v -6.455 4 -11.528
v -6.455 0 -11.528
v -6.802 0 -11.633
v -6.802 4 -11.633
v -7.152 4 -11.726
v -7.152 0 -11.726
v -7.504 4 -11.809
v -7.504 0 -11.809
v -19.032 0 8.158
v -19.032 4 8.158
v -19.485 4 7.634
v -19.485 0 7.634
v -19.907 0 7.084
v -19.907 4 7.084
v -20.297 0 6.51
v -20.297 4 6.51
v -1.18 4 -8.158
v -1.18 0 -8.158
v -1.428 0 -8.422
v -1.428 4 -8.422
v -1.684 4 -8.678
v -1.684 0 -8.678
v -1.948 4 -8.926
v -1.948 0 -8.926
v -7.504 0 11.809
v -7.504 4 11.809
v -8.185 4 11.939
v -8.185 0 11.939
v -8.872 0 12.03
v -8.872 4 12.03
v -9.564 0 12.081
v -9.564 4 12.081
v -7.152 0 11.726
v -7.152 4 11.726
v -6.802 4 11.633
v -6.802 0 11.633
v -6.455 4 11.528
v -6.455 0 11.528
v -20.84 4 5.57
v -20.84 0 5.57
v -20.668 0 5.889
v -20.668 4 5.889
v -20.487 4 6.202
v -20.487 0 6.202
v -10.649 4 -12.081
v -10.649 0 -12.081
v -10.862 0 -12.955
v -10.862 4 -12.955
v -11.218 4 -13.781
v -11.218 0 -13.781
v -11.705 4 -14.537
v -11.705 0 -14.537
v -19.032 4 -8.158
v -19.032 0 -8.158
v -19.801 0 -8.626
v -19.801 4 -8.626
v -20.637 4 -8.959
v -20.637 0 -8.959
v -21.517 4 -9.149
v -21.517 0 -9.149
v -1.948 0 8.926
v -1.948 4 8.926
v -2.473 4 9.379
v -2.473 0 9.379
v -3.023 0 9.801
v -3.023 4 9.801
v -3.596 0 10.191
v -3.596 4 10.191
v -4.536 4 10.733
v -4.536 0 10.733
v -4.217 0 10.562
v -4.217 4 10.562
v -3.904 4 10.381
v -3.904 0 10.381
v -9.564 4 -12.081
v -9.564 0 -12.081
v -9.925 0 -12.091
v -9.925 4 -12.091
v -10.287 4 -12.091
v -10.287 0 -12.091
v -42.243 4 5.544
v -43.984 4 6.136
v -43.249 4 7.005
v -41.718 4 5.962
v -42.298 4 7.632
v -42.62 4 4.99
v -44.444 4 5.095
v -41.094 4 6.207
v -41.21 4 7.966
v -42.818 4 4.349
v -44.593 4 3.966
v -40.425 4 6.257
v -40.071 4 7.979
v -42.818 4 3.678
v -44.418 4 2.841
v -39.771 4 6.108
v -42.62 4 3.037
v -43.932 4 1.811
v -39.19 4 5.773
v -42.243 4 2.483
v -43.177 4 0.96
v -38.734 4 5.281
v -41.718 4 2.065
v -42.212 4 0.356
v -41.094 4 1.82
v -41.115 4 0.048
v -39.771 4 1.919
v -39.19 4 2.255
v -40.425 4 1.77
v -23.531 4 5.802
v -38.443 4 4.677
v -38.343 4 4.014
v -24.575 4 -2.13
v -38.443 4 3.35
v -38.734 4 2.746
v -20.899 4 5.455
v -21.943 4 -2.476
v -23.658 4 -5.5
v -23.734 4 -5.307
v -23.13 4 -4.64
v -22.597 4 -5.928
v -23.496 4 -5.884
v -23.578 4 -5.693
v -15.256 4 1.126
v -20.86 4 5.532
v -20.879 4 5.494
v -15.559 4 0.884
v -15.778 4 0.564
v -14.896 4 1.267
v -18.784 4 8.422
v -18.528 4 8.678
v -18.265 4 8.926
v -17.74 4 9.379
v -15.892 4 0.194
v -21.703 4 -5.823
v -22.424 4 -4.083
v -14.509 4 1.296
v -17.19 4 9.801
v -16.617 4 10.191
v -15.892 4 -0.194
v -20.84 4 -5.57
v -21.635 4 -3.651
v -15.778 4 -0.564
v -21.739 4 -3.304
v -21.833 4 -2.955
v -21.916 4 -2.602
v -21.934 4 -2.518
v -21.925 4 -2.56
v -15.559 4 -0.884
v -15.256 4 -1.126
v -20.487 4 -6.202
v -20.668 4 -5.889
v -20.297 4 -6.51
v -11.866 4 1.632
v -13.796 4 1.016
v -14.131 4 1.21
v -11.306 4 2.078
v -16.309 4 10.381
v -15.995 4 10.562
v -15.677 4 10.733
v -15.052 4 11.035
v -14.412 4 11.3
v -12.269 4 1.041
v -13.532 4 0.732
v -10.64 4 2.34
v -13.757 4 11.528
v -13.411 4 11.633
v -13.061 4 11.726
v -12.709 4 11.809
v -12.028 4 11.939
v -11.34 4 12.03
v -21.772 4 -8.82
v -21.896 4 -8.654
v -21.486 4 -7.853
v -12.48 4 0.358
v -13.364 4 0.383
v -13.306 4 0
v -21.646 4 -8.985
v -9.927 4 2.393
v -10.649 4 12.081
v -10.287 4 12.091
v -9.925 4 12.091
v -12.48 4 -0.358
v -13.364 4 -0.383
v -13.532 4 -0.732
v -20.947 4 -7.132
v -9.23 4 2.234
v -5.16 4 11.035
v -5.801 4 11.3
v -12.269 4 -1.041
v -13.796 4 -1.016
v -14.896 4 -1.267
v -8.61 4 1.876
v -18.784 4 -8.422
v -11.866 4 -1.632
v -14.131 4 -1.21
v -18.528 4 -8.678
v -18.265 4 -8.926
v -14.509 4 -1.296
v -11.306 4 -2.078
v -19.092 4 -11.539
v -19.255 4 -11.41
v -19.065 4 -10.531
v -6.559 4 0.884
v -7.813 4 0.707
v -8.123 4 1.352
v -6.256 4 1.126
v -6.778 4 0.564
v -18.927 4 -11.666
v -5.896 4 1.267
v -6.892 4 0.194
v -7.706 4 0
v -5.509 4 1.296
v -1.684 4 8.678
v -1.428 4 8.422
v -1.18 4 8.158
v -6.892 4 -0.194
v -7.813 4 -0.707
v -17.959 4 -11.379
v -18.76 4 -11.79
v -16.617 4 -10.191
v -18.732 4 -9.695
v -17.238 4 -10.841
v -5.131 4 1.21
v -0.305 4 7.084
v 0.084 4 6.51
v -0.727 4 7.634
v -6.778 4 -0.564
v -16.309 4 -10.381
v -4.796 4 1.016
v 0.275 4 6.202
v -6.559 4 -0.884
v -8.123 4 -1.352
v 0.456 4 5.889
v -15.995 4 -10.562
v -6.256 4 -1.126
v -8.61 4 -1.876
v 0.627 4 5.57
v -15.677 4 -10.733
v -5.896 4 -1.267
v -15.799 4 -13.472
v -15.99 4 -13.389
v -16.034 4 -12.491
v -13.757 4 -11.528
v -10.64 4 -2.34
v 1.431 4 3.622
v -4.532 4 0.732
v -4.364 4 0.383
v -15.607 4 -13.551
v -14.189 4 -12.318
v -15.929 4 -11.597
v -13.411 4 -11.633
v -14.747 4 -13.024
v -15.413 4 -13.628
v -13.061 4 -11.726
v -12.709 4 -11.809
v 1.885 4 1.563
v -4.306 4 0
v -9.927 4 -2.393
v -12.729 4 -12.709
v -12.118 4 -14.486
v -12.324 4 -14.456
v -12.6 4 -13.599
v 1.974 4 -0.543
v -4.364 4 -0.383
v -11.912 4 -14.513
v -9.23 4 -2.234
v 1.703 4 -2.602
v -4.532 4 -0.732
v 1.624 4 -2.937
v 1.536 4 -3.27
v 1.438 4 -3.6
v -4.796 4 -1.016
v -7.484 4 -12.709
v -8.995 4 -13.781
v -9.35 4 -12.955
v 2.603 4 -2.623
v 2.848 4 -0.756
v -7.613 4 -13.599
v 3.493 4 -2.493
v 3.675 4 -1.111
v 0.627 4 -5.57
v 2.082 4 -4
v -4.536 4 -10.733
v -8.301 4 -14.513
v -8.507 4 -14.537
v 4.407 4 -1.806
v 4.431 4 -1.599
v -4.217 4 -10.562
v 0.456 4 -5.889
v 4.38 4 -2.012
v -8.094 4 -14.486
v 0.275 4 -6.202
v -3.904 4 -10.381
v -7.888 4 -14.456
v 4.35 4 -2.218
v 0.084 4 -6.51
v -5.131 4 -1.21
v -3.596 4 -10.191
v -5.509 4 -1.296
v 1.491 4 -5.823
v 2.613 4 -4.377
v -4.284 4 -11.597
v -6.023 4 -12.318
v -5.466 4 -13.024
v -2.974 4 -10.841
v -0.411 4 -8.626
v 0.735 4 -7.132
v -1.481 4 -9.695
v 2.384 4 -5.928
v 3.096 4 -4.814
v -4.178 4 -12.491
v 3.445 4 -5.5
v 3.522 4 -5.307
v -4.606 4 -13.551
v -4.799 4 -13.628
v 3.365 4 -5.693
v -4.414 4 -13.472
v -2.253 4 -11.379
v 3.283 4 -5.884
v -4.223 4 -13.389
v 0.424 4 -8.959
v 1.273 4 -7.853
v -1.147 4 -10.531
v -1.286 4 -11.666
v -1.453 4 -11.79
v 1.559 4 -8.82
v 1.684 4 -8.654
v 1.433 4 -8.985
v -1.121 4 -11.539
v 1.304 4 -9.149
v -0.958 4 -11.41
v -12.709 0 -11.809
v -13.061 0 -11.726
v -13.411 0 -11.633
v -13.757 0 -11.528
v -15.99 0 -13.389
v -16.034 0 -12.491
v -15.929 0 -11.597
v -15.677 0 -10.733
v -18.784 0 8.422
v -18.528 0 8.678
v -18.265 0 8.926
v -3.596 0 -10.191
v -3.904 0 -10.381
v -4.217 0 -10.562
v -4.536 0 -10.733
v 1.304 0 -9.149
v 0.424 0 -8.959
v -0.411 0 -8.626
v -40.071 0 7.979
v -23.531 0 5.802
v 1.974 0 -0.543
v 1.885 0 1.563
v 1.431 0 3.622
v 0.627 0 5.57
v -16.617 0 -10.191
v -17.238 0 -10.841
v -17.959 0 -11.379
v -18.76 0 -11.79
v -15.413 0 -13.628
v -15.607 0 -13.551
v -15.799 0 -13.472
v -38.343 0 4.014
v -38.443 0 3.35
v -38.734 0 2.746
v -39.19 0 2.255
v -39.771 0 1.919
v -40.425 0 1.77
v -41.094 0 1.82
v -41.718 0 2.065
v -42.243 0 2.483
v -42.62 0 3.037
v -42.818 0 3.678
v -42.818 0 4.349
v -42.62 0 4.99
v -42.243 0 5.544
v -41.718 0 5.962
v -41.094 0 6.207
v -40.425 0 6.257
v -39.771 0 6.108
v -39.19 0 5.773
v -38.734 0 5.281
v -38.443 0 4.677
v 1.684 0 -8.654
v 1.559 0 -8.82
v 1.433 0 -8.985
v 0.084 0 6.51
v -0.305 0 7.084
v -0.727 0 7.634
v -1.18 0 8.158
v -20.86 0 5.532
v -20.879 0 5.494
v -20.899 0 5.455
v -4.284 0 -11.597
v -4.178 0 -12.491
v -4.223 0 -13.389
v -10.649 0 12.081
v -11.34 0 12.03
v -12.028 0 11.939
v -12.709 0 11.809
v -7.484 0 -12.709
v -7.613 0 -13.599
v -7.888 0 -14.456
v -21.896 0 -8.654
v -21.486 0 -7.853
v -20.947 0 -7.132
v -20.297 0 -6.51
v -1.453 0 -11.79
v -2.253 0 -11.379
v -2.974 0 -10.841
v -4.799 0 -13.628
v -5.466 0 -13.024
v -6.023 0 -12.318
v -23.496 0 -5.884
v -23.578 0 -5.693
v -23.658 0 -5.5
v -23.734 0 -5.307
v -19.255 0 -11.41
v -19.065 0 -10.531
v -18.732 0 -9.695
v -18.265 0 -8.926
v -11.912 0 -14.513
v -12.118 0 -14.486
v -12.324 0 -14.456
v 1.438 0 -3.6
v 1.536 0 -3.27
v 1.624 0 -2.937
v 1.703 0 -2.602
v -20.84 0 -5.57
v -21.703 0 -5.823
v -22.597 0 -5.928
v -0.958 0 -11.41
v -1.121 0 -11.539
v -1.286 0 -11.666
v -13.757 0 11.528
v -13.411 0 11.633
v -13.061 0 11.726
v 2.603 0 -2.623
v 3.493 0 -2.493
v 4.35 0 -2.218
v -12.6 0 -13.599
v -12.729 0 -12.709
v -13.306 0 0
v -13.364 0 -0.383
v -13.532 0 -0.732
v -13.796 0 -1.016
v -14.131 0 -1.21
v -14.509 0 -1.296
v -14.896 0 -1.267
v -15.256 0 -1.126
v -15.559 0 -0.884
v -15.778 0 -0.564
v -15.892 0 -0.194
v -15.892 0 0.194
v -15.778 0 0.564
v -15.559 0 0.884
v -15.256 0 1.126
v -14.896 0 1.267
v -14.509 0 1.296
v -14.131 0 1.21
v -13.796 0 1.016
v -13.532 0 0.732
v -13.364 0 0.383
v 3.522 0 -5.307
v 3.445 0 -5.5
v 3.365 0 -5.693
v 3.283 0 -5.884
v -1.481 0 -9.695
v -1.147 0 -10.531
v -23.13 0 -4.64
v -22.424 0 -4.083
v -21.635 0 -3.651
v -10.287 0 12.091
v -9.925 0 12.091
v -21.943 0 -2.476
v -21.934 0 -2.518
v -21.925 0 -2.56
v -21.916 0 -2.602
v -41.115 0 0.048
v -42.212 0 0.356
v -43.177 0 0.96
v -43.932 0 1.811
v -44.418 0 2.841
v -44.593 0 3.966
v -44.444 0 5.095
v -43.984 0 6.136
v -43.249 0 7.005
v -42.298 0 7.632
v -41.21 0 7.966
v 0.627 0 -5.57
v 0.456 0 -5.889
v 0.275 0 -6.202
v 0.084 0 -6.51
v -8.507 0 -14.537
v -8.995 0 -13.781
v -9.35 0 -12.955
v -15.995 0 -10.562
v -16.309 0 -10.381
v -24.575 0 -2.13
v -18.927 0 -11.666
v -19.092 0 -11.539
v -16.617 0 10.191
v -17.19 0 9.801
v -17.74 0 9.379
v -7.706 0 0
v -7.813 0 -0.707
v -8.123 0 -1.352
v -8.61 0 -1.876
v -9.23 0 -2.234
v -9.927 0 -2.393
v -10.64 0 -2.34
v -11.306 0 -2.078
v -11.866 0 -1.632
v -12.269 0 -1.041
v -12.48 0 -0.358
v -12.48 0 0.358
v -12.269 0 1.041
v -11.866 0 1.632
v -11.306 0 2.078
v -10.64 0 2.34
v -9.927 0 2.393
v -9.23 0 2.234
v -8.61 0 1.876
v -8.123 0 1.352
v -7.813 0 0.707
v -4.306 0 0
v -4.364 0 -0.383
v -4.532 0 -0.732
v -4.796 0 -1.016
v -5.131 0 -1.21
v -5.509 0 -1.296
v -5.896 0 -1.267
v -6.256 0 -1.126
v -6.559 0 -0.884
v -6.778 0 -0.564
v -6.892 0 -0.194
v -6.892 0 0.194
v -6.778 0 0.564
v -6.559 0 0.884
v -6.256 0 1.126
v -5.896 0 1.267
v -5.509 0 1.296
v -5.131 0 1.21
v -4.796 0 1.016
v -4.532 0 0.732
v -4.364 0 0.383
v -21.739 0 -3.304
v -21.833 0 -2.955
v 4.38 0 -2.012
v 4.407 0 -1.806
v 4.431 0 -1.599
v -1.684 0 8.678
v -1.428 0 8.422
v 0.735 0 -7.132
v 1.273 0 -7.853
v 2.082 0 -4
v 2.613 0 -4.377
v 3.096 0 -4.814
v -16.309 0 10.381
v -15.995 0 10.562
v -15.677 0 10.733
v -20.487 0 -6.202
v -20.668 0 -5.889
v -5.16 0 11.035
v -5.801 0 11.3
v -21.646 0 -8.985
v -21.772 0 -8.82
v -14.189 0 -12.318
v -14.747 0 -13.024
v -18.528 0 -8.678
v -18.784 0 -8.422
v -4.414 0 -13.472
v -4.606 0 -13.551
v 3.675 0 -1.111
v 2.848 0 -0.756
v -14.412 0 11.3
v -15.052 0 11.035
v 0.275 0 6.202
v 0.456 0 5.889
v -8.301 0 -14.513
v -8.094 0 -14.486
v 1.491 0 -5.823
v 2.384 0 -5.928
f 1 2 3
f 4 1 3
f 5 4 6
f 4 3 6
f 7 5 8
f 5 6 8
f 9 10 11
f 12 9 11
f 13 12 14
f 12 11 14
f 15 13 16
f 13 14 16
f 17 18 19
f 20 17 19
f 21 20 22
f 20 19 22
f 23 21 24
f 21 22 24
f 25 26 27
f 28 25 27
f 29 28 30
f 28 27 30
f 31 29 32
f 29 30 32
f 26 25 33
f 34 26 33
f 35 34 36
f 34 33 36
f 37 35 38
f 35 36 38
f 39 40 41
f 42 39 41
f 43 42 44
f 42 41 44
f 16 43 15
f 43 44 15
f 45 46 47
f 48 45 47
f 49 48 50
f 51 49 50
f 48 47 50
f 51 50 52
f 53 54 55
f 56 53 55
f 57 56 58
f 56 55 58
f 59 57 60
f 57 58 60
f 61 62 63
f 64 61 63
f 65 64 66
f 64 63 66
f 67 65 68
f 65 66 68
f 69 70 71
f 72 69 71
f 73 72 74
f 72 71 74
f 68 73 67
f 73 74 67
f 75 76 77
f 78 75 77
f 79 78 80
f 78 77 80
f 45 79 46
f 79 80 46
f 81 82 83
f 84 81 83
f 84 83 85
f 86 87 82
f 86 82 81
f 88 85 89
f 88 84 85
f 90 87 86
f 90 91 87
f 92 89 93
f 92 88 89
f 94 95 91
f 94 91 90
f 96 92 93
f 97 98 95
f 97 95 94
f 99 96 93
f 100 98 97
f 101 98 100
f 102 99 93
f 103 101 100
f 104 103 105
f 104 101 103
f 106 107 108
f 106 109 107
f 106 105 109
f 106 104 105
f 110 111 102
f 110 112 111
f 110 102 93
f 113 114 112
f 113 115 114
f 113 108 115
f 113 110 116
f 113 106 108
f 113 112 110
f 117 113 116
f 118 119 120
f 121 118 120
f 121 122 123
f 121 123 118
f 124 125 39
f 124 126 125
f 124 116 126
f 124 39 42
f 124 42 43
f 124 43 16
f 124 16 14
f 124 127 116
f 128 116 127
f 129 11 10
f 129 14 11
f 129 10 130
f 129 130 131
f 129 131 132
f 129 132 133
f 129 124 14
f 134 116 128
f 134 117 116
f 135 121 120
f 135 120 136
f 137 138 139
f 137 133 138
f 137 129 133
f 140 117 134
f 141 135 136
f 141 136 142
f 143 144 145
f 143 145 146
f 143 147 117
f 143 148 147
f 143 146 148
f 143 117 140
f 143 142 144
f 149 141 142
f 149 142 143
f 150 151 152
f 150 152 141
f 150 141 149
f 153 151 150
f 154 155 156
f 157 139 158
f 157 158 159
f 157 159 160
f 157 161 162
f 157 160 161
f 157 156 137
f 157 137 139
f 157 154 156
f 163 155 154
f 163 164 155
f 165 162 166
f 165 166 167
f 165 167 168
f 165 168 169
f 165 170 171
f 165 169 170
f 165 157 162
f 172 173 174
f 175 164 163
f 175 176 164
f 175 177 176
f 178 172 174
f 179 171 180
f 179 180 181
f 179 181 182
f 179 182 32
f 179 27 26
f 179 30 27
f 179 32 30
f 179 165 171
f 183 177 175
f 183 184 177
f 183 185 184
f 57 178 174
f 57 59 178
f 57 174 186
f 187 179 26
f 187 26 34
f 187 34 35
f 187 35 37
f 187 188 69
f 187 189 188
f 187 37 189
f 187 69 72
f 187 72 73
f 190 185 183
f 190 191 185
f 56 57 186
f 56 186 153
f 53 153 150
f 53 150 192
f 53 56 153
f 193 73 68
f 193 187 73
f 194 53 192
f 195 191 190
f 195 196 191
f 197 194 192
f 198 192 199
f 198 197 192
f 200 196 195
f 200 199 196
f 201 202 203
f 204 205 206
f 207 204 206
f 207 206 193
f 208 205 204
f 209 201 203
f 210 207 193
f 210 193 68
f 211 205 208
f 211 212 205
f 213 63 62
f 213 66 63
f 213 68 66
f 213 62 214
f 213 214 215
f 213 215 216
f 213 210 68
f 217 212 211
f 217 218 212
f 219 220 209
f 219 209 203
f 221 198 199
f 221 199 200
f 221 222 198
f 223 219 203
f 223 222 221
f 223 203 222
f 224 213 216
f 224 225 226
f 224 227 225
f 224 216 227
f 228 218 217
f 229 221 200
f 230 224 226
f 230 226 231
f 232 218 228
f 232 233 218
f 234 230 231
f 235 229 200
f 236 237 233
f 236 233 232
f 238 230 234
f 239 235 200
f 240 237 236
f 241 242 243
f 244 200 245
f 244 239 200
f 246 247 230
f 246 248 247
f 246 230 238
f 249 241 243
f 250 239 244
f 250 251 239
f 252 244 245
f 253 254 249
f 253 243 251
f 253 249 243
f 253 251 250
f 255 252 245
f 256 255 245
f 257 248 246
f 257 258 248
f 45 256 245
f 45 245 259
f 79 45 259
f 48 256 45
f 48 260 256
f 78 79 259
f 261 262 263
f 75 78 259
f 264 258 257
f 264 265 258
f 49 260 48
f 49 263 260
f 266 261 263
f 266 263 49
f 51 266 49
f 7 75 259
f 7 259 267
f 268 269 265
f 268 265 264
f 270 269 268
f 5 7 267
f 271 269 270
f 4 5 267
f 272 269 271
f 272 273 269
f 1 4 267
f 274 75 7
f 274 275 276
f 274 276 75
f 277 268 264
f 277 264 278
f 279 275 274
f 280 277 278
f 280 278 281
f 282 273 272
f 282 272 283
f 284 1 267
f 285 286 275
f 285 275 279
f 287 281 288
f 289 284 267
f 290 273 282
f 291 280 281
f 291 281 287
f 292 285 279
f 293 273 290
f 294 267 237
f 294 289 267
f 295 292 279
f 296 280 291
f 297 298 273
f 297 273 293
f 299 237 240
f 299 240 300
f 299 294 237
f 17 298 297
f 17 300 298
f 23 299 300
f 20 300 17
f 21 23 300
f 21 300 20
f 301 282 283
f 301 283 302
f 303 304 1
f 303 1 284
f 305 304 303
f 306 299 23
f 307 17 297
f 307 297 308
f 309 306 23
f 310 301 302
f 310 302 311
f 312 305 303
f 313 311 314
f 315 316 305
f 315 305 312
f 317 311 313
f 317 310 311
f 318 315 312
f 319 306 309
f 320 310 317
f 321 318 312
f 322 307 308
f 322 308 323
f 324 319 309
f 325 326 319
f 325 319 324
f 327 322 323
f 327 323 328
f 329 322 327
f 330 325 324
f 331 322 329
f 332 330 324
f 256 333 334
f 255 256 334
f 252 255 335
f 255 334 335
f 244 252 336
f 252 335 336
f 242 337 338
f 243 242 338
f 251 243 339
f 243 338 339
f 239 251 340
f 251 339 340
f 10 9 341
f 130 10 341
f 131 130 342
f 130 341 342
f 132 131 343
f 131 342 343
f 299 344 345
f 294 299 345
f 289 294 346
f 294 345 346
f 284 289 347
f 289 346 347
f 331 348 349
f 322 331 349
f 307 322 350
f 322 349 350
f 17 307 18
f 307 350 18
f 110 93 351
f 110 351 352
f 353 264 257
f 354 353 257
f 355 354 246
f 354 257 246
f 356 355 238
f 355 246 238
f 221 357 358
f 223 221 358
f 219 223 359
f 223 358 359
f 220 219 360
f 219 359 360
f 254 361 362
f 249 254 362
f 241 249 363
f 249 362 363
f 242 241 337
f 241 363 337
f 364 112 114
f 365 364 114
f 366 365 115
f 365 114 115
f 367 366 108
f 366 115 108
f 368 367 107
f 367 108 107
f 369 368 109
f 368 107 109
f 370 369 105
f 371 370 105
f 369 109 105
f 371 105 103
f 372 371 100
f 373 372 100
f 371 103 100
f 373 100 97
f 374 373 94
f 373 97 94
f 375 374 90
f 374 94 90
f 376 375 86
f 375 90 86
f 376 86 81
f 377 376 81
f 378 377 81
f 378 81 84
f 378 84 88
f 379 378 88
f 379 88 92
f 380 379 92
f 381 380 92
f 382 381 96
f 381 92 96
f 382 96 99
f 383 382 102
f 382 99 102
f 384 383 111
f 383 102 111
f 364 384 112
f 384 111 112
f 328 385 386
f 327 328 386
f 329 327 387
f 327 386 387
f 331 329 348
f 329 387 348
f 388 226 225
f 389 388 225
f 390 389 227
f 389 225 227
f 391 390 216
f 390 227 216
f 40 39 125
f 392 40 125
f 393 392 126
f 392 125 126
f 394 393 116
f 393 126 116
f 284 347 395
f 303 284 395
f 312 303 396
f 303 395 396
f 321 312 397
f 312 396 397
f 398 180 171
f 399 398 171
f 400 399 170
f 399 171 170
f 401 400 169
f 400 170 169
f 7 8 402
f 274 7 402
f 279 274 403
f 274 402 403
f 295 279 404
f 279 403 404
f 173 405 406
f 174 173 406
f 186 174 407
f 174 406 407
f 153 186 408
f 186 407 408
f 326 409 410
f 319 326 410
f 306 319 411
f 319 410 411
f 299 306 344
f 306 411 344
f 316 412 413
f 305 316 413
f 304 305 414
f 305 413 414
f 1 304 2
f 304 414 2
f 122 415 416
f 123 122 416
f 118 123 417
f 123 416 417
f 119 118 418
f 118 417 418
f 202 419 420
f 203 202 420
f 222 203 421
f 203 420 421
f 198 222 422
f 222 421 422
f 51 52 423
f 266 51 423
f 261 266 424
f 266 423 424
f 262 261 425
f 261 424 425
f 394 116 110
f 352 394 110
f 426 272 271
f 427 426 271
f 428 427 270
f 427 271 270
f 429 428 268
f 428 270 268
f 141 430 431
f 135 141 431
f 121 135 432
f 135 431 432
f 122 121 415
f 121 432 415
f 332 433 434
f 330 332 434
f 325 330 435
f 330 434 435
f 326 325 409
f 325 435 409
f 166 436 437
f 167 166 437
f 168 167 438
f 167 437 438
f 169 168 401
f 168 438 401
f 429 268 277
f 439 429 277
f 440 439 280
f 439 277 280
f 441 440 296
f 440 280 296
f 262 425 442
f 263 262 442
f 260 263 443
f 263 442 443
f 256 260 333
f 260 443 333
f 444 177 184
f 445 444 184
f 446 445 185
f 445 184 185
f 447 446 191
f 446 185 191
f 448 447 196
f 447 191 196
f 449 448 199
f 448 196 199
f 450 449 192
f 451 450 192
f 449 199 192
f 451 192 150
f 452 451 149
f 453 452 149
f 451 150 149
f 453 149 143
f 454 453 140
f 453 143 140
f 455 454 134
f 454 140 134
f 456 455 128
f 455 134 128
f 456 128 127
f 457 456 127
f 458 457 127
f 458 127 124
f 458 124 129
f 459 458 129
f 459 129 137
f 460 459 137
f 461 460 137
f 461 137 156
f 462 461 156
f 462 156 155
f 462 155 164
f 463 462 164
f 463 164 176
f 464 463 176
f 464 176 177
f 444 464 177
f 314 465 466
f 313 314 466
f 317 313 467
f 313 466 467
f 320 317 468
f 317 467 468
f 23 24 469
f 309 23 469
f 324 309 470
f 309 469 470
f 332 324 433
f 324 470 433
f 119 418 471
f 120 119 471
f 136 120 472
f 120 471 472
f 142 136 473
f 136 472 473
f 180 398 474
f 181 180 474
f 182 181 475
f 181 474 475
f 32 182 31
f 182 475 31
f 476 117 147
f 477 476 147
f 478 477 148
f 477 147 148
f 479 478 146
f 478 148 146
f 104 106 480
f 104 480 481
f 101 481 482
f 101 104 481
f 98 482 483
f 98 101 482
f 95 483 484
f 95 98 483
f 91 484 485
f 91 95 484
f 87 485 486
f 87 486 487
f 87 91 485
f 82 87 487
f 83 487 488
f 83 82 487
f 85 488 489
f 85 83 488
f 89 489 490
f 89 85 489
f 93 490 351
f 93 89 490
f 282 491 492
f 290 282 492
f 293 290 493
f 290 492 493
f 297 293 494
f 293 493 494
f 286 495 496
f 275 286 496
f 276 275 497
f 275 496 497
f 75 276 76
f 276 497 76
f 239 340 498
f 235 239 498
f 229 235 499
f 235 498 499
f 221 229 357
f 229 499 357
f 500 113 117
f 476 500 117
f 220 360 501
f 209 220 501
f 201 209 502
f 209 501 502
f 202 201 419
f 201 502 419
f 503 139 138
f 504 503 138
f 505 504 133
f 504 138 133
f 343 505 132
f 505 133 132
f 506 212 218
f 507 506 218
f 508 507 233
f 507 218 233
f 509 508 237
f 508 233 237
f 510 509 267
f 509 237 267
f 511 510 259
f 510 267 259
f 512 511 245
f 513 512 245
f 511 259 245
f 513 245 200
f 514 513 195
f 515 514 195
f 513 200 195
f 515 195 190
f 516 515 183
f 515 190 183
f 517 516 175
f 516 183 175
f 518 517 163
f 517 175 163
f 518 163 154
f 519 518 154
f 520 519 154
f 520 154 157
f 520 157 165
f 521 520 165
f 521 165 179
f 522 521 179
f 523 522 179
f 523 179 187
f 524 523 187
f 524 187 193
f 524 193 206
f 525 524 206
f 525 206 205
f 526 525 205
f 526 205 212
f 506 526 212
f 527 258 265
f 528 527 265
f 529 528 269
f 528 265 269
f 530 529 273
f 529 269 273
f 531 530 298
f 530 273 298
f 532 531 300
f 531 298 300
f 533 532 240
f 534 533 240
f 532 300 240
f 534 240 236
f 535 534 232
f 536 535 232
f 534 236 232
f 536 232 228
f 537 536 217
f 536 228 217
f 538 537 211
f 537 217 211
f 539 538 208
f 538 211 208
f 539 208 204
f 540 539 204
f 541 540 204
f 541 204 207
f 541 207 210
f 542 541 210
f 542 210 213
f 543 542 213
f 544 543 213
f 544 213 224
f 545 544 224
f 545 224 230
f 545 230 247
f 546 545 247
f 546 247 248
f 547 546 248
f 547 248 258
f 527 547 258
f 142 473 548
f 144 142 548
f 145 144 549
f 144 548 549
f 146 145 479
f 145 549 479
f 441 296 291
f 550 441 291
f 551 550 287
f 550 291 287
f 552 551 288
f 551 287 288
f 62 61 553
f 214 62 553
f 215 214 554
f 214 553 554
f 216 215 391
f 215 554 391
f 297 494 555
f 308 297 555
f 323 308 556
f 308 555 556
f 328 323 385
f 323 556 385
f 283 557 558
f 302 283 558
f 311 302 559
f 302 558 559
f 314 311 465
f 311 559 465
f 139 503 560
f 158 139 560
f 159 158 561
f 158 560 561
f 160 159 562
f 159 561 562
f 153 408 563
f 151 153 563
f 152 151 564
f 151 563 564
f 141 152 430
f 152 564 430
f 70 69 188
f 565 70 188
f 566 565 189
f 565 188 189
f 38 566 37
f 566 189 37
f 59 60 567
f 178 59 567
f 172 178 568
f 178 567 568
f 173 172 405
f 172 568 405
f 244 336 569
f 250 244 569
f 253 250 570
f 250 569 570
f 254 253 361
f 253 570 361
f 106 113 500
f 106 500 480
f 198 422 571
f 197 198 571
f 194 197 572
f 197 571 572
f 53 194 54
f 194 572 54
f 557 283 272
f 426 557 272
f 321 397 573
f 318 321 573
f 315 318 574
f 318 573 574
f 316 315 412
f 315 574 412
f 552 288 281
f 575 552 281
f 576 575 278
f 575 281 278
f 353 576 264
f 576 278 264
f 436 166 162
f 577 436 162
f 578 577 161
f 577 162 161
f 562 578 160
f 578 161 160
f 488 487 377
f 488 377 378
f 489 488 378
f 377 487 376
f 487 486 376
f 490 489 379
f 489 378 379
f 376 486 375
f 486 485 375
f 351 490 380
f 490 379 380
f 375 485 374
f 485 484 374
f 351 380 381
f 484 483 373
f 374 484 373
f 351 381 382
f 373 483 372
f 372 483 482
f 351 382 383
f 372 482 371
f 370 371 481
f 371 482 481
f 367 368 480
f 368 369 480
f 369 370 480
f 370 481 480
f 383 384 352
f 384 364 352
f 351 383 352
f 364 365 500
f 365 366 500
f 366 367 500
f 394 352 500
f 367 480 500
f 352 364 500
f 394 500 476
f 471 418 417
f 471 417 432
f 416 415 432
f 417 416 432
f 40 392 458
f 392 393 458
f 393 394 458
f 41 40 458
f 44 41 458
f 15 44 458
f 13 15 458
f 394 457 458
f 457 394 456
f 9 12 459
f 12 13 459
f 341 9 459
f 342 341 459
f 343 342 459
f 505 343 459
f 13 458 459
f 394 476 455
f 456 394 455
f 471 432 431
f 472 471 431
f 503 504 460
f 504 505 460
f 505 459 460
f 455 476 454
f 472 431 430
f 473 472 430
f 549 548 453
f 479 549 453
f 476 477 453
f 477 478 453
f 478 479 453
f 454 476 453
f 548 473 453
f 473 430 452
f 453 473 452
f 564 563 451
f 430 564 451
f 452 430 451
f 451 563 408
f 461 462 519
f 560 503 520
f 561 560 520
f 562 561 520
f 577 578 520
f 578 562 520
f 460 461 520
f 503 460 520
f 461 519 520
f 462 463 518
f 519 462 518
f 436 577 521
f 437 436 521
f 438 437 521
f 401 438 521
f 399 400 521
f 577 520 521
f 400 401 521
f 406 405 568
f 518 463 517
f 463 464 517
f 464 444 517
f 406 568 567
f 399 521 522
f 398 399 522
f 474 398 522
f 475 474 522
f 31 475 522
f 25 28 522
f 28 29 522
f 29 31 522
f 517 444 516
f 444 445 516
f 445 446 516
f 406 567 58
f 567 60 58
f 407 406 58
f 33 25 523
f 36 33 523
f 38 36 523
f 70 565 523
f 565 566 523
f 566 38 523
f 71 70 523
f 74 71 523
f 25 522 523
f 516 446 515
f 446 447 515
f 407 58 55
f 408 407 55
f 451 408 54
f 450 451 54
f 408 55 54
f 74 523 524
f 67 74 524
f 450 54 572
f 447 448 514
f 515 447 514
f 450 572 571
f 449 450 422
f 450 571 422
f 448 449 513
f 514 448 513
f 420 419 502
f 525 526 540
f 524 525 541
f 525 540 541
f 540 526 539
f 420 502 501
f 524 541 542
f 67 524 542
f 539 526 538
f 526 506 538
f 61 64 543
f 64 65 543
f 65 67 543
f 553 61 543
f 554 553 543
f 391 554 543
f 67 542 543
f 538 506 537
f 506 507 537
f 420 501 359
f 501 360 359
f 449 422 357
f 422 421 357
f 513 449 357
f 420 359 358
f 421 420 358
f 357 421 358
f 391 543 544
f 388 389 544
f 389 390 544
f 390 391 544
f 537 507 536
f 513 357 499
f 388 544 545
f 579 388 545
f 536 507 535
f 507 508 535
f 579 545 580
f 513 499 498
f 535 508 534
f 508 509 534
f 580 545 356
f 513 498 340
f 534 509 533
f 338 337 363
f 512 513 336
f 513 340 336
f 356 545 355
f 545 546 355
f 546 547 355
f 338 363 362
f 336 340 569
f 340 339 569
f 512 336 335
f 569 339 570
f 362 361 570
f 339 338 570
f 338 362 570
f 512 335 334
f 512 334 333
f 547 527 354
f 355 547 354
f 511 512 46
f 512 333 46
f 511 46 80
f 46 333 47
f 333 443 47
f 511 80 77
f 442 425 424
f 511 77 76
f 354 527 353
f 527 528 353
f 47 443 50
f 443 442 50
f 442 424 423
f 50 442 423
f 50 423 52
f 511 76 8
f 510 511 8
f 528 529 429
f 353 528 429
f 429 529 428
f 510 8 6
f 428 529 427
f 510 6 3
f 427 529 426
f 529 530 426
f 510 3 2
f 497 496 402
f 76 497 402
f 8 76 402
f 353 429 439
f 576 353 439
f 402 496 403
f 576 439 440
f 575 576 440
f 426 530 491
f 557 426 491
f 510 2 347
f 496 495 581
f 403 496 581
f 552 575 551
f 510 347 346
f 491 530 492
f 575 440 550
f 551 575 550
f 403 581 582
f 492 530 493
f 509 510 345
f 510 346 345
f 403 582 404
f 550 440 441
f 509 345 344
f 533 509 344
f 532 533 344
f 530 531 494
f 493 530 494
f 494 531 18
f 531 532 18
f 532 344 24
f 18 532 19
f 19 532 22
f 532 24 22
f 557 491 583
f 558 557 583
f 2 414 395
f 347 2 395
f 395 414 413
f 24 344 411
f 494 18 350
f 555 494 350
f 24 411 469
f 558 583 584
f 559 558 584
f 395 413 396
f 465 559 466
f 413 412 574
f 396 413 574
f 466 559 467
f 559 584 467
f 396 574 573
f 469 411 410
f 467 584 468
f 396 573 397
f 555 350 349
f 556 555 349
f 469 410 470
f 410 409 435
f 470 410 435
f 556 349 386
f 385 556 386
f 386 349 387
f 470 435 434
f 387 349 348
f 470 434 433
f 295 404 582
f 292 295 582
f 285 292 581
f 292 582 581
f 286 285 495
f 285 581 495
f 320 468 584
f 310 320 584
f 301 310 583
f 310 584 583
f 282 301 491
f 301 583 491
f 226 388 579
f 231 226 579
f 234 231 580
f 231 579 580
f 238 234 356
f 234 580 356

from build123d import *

# Parameters (mm, degrees)
SKETCH1_R           = 1.5
SKETCH1_R_2         = 2.25
BOSS_EXTRUDE1_DEPTH = 4
SKETCH3_R           = 2.25
BOSS_EXTRUDE2_DEPTH = 4
CUT_EXTRUDE1_DEPTH  = 4
CUT_EXTRUDE2_REACH  = 6
SKETCH5_R           = 1.3
SKETCH5_R_2         = 2.4


with BuildPart() as part:
    # Sketch1 → Boss-Extrude1 (new body)
    with BuildSketch(Plane(origin=(0, 0, 0), x_dir=(1, 0, 0), z_dir=(0, 1, 0))):
        with BuildLine():
            Line((20.643657446, 4), (2.081641936, 4))
            ThreePointArc((2.081641936, 4), (2.861028333, 4.588201733), (3.521749436, 5.30713988))
            ThreePointArc((3.521749436, 5.30713988), (3.405395609, 5.596745198), (3.282888305, 5.883801663))
            ThreePointArc((3.282888305, 5.883801663), (1.93527598, 5.894040025), (0.627094961, 5.57027124))
            ThreePointArc((0.627094961, 5.57027124), (0.366286148, 6.046375), (0.084372603, 6.510293938))
            ThreePointArc((0.084372603, 6.510293938), (1.018855105, 7.48132754), (1.683794586, 8.65351323))
            ThreePointArc((1.683794586, 8.65351323), (1.496450048, 8.903135899), (1.303821399, 9.148703928))
            ThreePointArc((1.303821399, 9.148703928), (-0.000522033, 8.809805691), (-1.180330337, 8.158486898))
            ThreePointArc((-1.180330337, 8.158486898), (-1.555477026, 8.550865528), (-1.947855656, 8.926012217))
            ThreePointArc((-1.947855656, 8.926012217), (-1.296536862, 10.105820521), (-0.957638625, 11.410163953))
            ThreePointArc((-0.957638625, 11.410163953), (-1.203206655, 11.602792602), (-1.452829324, 11.79013714))
            ThreePointArc((-1.452829324, 11.79013714), (-2.625015014, 11.125197659), (-3.596048616, 10.190715157))
            ThreePointArc((-3.596048616, 10.190715157), (-4.059967554, 10.472628702), (-4.536071314, 10.733437515))
            ThreePointArc((-4.536071314, 10.733437515), (-4.212302529, 12.041618533), (-4.222540891, 13.389230859))
            ThreePointArc((-4.222540891, 13.389230859), (-4.509597355, 13.511738163), (-4.799202674, 13.62809199))
            ThreePointArc((-4.799202674, 13.62809199), (-5.759348103, 12.682425791), (-6.455432668, 11.528463019))
            ThreePointArc((-6.455432668, 11.528463019), (-6.976508546, 11.680699536), (-7.503891752, 11.809396783))
            ThreePointArc((-7.503891752, 11.809396783), (-7.529737283, 13.156800143), (-7.888414517, 14.455843809))
            ThreePointArc((-7.888414517, 14.455843809), (-8.197396993, 14.499881098), (-8.507248835, 14.537314892))
            ThreePointArc((-8.507248835, 14.537314892), (-9.18992168, 13.375367565), (-9.563620196, 12.080565177))
            ThreePointArc((-9.563620196, 12.080565177), (-10.106342554, 12.09275), (-10.649064912, 12.080565177))
            ThreePointArc((-10.649064912, 12.080565177), (-11.022763428, 13.375367565), (-11.705436272, 14.537314892))
            ThreePointArc((-11.705436272, 14.537314892), (-12.015288115, 14.499881098), (-12.324270591, 14.455843809))
            ThreePointArc((-12.324270591, 14.455843809), (-12.682947825, 13.156800143), (-12.708793355, 11.809396783))
            ThreePointArc((-12.708793355, 11.809396783), (-13.236176561, 11.680699536), (-13.757252439, 11.528463019))
            ThreePointArc((-13.757252439, 11.528463019), (-14.453337005, 12.682425791), (-15.413482434, 13.62809199))
            ThreePointArc((-15.413482434, 13.62809199), (-15.703087752, 13.511738163), (-15.990144217, 13.389230859))
            ThreePointArc((-15.990144217, 13.389230859), (-16.000382579, 12.041618533), (-15.676613793, 10.733437515))
            ThreePointArc((-15.676613793, 10.733437515), (-16.152717554, 10.472628702), (-16.616636492, 10.190715157))
            ThreePointArc((-16.616636492, 10.190715157), (-17.587670094, 11.125197659), (-18.759855783, 11.79013714))
            ThreePointArc((-18.759855783, 11.79013714), (-19.009478453, 11.602792602), (-19.255046482, 11.410163953))
            ThreePointArc((-19.255046482, 11.410163953), (-18.916148245, 10.105820521), (-18.264829452, 8.926012217))
            ThreePointArc((-18.264829452, 8.926012217), (-18.657208082, 8.550865528), (-19.032354771, 8.158486898))
            ThreePointArc((-19.032354771, 8.158486898), (-20.212163074, 8.809805691), (-21.516506507, 9.148703928))
            ThreePointArc((-21.516506507, 9.148703928), (-21.709135156, 8.903135899), (-21.896479694, 8.65351323))
            ThreePointArc((-21.896479694, 8.65351323), (-21.231540213, 7.48132754), (-20.297057711, 6.510293938))
            ThreePointArc((-20.297057711, 6.510293938), (-20.578971255, 6.046375), (-20.839780068, 5.57027124))
            ThreePointArc((-20.839780068, 5.57027124), (-22.147961087, 5.894040025), (-23.495573413, 5.883801663))
            ThreePointArc((-23.495573413, 5.883801663), (-23.618080717, 5.596745198), (-23.734434544, 5.30713988))
            ThreePointArc((-23.734434544, 5.30713988), (-22.788768345, 4.346994451), (-21.634805572, 3.650909885))
            ThreePointArc((-21.634805572, 3.650909885), (-21.78704209, 3.129834008), (-21.915739337, 2.602450802))
            ThreePointArc((-21.915739337, 2.602450802), (-23.263142697, 2.576605271), (-24.562186363, 2.217928037))
            ThreePointArc((-24.562186363, 2.217928037), (-24.606223651, 1.908945561), (-24.643657446, 1.599093719))
            ThreePointArc((-24.643657446, 1.599093719), (-23.481710119, 0.916420874), (-22.186907731, 0.542722358))
            ThreePointArc((-22.186907731, 0.542722358), (-22.199092554, 0), (-22.186907731, -0.542722358))
            ThreePointArc((-22.186907731, -0.542722358), (-23.481710119, -0.916420874), (-24.643657446, -1.599093719))
            ThreePointArc((-24.643657446, -1.599093719), (-24.606223651, -1.908945561), (-24.562186363, -2.217928037))
            ThreePointArc((-24.562186363, -2.217928037), (-23.263142697, -2.576605271), (-21.915739337, -2.602450802))
            ThreePointArc((-21.915739337, -2.602450802), (-21.78704209, -3.129834008), (-21.634805572, -3.650909885))
            ThreePointArc((-21.634805572, -3.650909885), (-22.788768345, -4.346994451), (-23.734434544, -5.30713988))
            ThreePointArc((-23.734434544, -5.30713988), (-23.618080717, -5.596745198), (-23.495573413, -5.883801663))
            ThreePointArc((-23.495573413, -5.883801663), (-22.147961087, -5.894040025), (-20.839780068, -5.57027124))
            ThreePointArc((-20.839780068, -5.57027124), (-20.578971255, -6.046375), (-20.297057711, -6.510293938))
            ThreePointArc((-20.297057711, -6.510293938), (-21.231540213, -7.48132754), (-21.896479694, -8.65351323))
            ThreePointArc((-21.896479694, -8.65351323), (-21.709135156, -8.903135899), (-21.516506507, -9.148703928))
            ThreePointArc((-21.516506507, -9.148703928), (-20.212163074, -8.809805691), (-19.032354771, -8.158486898))
            ThreePointArc((-19.032354771, -8.158486898), (-18.657208082, -8.550865528), (-18.264829452, -8.926012217))
            ThreePointArc((-18.264829452, -8.926012217), (-18.916148245, -10.105820521), (-19.255046482, -11.410163953))
            ThreePointArc((-19.255046482, -11.410163953), (-19.009478453, -11.602792602), (-18.759855783, -11.79013714))
            ThreePointArc((-18.759855783, -11.79013714), (-17.587670094, -11.125197659), (-16.616636492, -10.190715157))
            ThreePointArc((-16.616636492, -10.190715157), (-16.152717554, -10.472628702), (-15.676613793, -10.733437515))
            ThreePointArc((-15.676613793, -10.733437515), (-16.000382579, -12.041618533), (-15.990144217, -13.389230859))
            ThreePointArc((-15.990144217, -13.389230859), (-15.703087752, -13.511738163), (-15.413482434, -13.62809199))
            ThreePointArc((-15.413482434, -13.62809199), (-14.453337005, -12.682425791), (-13.757252439, -11.528463019))
            ThreePointArc((-13.757252439, -11.528463019), (-13.236176561, -11.680699536), (-12.708793355, -11.809396783))
            ThreePointArc((-12.708793355, -11.809396783), (-12.682947825, -13.156800143), (-12.324270591, -14.455843809))
            ThreePointArc((-12.324270591, -14.455843809), (-12.015288115, -14.499881098), (-11.705436272, -14.537314892))
            ThreePointArc((-11.705436272, -14.537314892), (-11.022763428, -13.375367565), (-10.649064912, -12.080565177))
            ThreePointArc((-10.649064912, -12.080565177), (-10.106342554, -12.09275), (-9.563620196, -12.080565177))
            ThreePointArc((-9.563620196, -12.080565177), (-9.18992168, -13.375367565), (-8.507248835, -14.537314892))
            ThreePointArc((-8.507248835, -14.537314892), (-8.197396993, -14.499881098), (-7.888414517, -14.455843809))
            ThreePointArc((-7.888414517, -14.455843809), (-7.529737283, -13.156800143), (-7.503891752, -11.809396783))
            ThreePointArc((-7.503891752, -11.809396783), (-6.976508546, -11.680699536), (-6.455432668, -11.528463019))
            ThreePointArc((-6.455432668, -11.528463019), (-5.759348103, -12.682425791), (-4.799202674, -13.62809199))
            ThreePointArc((-4.799202674, -13.62809199), (-4.509597355, -13.511738163), (-4.222540891, -13.389230859))
            ThreePointArc((-4.222540891, -13.389230859), (-4.212302529, -12.041618533), (-4.536071314, -10.733437515))
            ThreePointArc((-4.536071314, -10.733437515), (-4.059967554, -10.472628702), (-3.596048616, -10.190715157))
            ThreePointArc((-3.596048616, -10.190715157), (-2.625015014, -11.125197659), (-1.452829324, -11.79013714))
            ThreePointArc((-1.452829324, -11.79013714), (-1.203206655, -11.602792602), (-0.957638625, -11.410163953))
            ThreePointArc((-0.957638625, -11.410163953), (-1.296536862, -10.105820521), (-1.947855656, -8.926012217))
            ThreePointArc((-1.947855656, -8.926012217), (-1.555477026, -8.550865528), (-1.180330337, -8.158486898))
            ThreePointArc((-1.180330337, -8.158486898), (-0.000522033, -8.809805691), (1.303821399, -9.148703928))
            ThreePointArc((1.303821399, -9.148703928), (1.496450048, -8.903135899), (1.683794586, -8.65351323))
            ThreePointArc((1.683794586, -8.65351323), (1.018855105, -7.48132754), (0.084372603, -6.510293938))
            ThreePointArc((0.084372603, -6.510293938), (0.366286148, -6.046375), (0.627094961, -5.57027124))
            ThreePointArc((0.627094961, -5.57027124), (1.93527598, -5.894040025), (3.282888305, -5.883801663))
            ThreePointArc((3.282888305, -5.883801663), (3.405395609, -5.596745198), (3.521749436, -5.30713988))
            ThreePointArc((3.521749436, -5.30713988), (2.861028333, -4.588201733), (2.081641936, -4))
            Line((2.081641936, -4), (20.643657446, -4))
            ThreePointArc((20.643657446, -4), (24.643657446, 0), (20.643657446, 4))
        make_face()
        with Locations((-10.106342554, 0)):
            Circle(SKETCH1_R, mode=Mode.SUBTRACT)
        with Locations((20.643657446, 0)):
            Circle(SKETCH1_R_2, mode=Mode.SUBTRACT)
    extrude(amount=BOSS_EXTRUDE1_DEPTH)

    # Sketch3 → Boss-Extrude2 (add)
    with BuildSketch(Plane(origin=(0, 4, 0), x_dir=(1, 0, 0), z_dir=(0, 1, 0))):
        with BuildLine():
            ThreePointArc((-9.584237785, -3.965779445), (-14.072121999, -0.522104769), (-10.628447323, 3.965779445))
            Line((-10.628447323, 3.965779445), (-41.11537681, -0.047900965))
            ThreePointArc((-41.11537681, -0.047900965), (-44.559051487, -4.53578518), (-40.071167272, -7.979459856))
            Line((-40.071167272, -7.979459856), (-9.584237785, -3.965779445))
        make_face()
        with Locations((-40.593272041, -4.013680411)):
            Circle(SKETCH3_R, mode=Mode.SUBTRACT)
    extrude(amount=-BOSS_EXTRUDE2_DEPTH)

    # Sketch4 → Cut-Extrude1 (cut)
    with BuildSketch(Plane(origin=(0, 4, 0), x_dir=(1, 0, 0), z_dir=(0, 1, 0))):
        with BuildLine():
            ThreePointArc((20.643657446, -4), (24.643657446, 0), (20.643657446, 4))
            Line((20.643657446, 4), (2.081641936, 4))
            Line((2.081641936, 4), (1.43808022, 3.600125745))
            ThreePointArc((1.43808022, 3.600125745), (1.581217534, 3.104116905), (1.70305423, 2.602450802))
            ThreePointArc((1.70305423, 2.602450802), (3.050457589, 2.576605271), (4.349501255, 2.217928037))
            ThreePointArc((4.349501255, 2.217928037), (4.393538544, 1.908945561), (4.430972339, 1.599093719))
            ThreePointArc((4.430972339, 1.599093719), (3.269025011, 0.916420874), (1.974222624, 0.542722358))
            ThreePointArc((1.974222624, 0.542722358), (1.70305423, -2.602450802), (0.627094961, -5.57027124))
            ThreePointArc((0.627094961, -5.57027124), (1.93527598, -5.894040025), (3.282888305, -5.883801663))
            ThreePointArc((3.282888305, -5.883801663), (3.405395609, -5.596745198), (3.521749436, -5.30713988))
            ThreePointArc((3.521749436, -5.30713988), (2.861028333, -4.588201733), (2.081641936, -4))
            Line((2.081641936, -4), (20.643657446, -4))
        make_face()
        with BuildLine():
            ThreePointArc((1.683794586, -8.65351323), (1.018855105, -7.48132754), (0.084372603, -6.510293938))
            ThreePointArc((0.084372603, -6.510293938), (-0.512518948, -7.361599771), (-1.180330337, -8.158486898))
            ThreePointArc((-1.180330337, -8.158486898), (-0.000522033, -8.809805691), (1.303821399, -9.148703928))
            ThreePointArc((1.303821399, -9.148703928), (1.496450048, -8.903135899), (1.683794586, -8.65351323))
        make_face()
        with BuildLine():
            ThreePointArc((-0.957638625, -11.410163953), (-1.296536862, -10.105820521), (-1.947855656, -8.926012217))
            ThreePointArc((-1.947855656, -8.926012217), (-2.744742783, -9.593823606), (-3.596048616, -10.190715157))
            ThreePointArc((-3.596048616, -10.190715157), (-2.625015014, -11.125197659), (-1.452829324, -11.79013714))
            ThreePointArc((-1.452829324, -11.79013714), (-1.203206655, -11.602792602), (-0.957638625, -11.410163953))
        make_face()
        with BuildLine():
            ThreePointArc((-4.222540891, -13.389230859), (-4.212302529, -12.041618533), (-4.536071314, -10.733437515))
            ThreePointArc((-4.536071314, -10.733437515), (-5.478647477, -11.172244217), (-6.455432668, -11.528463019))
            ThreePointArc((-6.455432668, -11.528463019), (-5.759348103, -12.682425791), (-4.799202674, -13.62809199))
            ThreePointArc((-4.799202674, -13.62809199), (-4.509597355, -13.511738163), (-4.222540891, -13.389230859))
        make_face()
        with BuildLine():
            ThreePointArc((-7.888414517, -14.455843809), (-7.529737283, -13.156800143), (-7.503891752, -11.809396783))
            ThreePointArc((-7.503891752, -11.809396783), (-8.527921943, -11.989294847), (-9.563620196, -12.080565177))
            ThreePointArc((-9.563620196, -12.080565177), (-9.18992168, -13.375367565), (-8.507248835, -14.537314892))
            ThreePointArc((-8.507248835, -14.537314892), (-8.197396993, -14.499881098), (-7.888414517, -14.455843809))
        make_face()
        with BuildLine():
            ThreePointArc((-11.705436272, -14.537314892), (-11.022763428, -13.375367565), (-10.649064912, -12.080565177))
            ThreePointArc((-10.649064912, -12.080565177), (-11.684763165, -11.989294847), (-12.708793355, -11.809396783))
            ThreePointArc((-12.708793355, -11.809396783), (-12.682947825, -13.156800143), (-12.324270591, -14.455843809))
            ThreePointArc((-12.324270591, -14.455843809), (-12.015288115, -14.499881098), (-11.705436272, -14.537314892))
        make_face()
        with BuildLine():
            ThreePointArc((-15.413482434, -13.62809199), (-14.453337005, -12.682425791), (-13.757252439, -11.528463019))
            ThreePointArc((-13.757252439, -11.528463019), (-14.734037631, -11.172244217), (-15.676613793, -10.733437515))
            ThreePointArc((-15.676613793, -10.733437515), (-16.000382579, -12.041618533), (-15.990144217, -13.389230859))
            ThreePointArc((-15.990144217, -13.389230859), (-15.703087752, -13.511738163), (-15.413482434, -13.62809199))
        make_face()
        with BuildLine():
            ThreePointArc((-18.759855783, -11.79013714), (-17.587670094, -11.125197659), (-16.616636492, -10.190715157))
            ThreePointArc((-16.616636492, -10.190715157), (-17.467942324, -9.593823606), (-18.264829452, -8.926012217))
            ThreePointArc((-18.264829452, -8.926012217), (-18.916148245, -10.105820521), (-19.255046482, -11.410163953))
            ThreePointArc((-19.255046482, -11.410163953), (-19.009478453, -11.602792602), (-18.759855783, -11.79013714))
        make_face()
        with BuildLine():
            ThreePointArc((-21.516506507, -9.148703928), (-20.212163074, -8.809805691), (-19.032354771, -8.158486898))
            ThreePointArc((-19.032354771, -8.158486898), (-19.70016616, -7.361599771), (-20.297057711, -6.510293938))
            ThreePointArc((-20.297057711, -6.510293938), (-21.231540213, -7.48132754), (-21.896479694, -8.65351323))
            ThreePointArc((-21.896479694, -8.65351323), (-21.709135156, -8.903135899), (-21.516506507, -9.148703928))
        make_face()
        with BuildLine():
            ThreePointArc((-21.942853375, 2.47620963), (-21.92946485, 2.539366405), (-21.915739337, 2.602450802))
            ThreePointArc((-21.915739337, 2.602450802), (-23.263142697, 2.576605271), (-24.562186363, 2.217928037))
            ThreePointArc((-24.562186363, 2.217928037), (-24.56889027, 2.173784387), (-24.575459377, 2.129620475))
            Line((-24.575459377, 2.129620475), (-21.942853375, 2.47620963))
        make_face()
        with BuildLine():
            ThreePointArc((-23.495573413, -5.883801663), (-22.147961087, -5.894040025), (-20.839780068, -5.57027124))
            ThreePointArc((-20.839780068, -5.57027124), (-20.869365339, -5.512888815), (-20.898643838, -5.455349261))
            Line((-20.898643838, -5.455349261), (-23.531249839, -5.801938416))
            ThreePointArc((-23.531249839, -5.801938416), (-23.513474108, -5.842897269), (-23.495573413, -5.883801663))
        make_face()
    extrude(amount=-CUT_EXTRUDE1_DEPTH, mode=Mode.SUBTRACT)

    # Sketch5 → Cut-Extrude2 (cut, up to next)
    with BuildSketch(Plane(origin=(0, 4, 0), x_dir=(1, 0, 0), z_dir=(0, 1, 0)), mode=Mode.PRIVATE) as cut_extrude2_sk1:
        with Locations((-14.606342554, 0)):
            Circle(SKETCH5_R)
    cut_extrude2_tool1 = extrude(cut_extrude2_sk1.sketch, amount=-CUT_EXTRUDE2_REACH, mode=Mode.PRIVATE) & part.part
    add(cut_extrude2_tool1.solids().sort_by_distance((-14.606343, 4, 0))[0], mode=Mode.SUBTRACT)
    # Sketch5 → Cut-Extrude2 (cut, up to next)
    with BuildSketch(Plane(origin=(0, 4, 0), x_dir=(1, 0, 0), z_dir=(0, 1, 0)), mode=Mode.PRIVATE) as cut_extrude2_sk2:
        with Locations((-5.606342554, 0)):
            Circle(SKETCH5_R)
    cut_extrude2_tool2 = extrude(cut_extrude2_sk2.sketch, amount=-CUT_EXTRUDE2_REACH, mode=Mode.PRIVATE) & part.part
    add(cut_extrude2_tool2.solids().sort_by_distance((-5.606343, 4, 0))[0], mode=Mode.SUBTRACT)
    # Sketch5 → Cut-Extrude2 (cut, up to next)
    with BuildSketch(Plane(origin=(0, 4, 0), x_dir=(1, 0, 0), z_dir=(0, 1, 0)), mode=Mode.PRIVATE) as cut_extrude2_sk3:
        with Locations((-10.106342554, 0)):
            Circle(SKETCH5_R_2)
    cut_extrude2_tool3 = extrude(cut_extrude2_sk3.sketch, amount=-CUT_EXTRUDE2_REACH, mode=Mode.PRIVATE) & part.part
    add(cut_extrude2_tool3.solids().sort_by_distance((-10.106343, 4, 0))[0], mode=Mode.SUBTRACT)


solid = part.part
